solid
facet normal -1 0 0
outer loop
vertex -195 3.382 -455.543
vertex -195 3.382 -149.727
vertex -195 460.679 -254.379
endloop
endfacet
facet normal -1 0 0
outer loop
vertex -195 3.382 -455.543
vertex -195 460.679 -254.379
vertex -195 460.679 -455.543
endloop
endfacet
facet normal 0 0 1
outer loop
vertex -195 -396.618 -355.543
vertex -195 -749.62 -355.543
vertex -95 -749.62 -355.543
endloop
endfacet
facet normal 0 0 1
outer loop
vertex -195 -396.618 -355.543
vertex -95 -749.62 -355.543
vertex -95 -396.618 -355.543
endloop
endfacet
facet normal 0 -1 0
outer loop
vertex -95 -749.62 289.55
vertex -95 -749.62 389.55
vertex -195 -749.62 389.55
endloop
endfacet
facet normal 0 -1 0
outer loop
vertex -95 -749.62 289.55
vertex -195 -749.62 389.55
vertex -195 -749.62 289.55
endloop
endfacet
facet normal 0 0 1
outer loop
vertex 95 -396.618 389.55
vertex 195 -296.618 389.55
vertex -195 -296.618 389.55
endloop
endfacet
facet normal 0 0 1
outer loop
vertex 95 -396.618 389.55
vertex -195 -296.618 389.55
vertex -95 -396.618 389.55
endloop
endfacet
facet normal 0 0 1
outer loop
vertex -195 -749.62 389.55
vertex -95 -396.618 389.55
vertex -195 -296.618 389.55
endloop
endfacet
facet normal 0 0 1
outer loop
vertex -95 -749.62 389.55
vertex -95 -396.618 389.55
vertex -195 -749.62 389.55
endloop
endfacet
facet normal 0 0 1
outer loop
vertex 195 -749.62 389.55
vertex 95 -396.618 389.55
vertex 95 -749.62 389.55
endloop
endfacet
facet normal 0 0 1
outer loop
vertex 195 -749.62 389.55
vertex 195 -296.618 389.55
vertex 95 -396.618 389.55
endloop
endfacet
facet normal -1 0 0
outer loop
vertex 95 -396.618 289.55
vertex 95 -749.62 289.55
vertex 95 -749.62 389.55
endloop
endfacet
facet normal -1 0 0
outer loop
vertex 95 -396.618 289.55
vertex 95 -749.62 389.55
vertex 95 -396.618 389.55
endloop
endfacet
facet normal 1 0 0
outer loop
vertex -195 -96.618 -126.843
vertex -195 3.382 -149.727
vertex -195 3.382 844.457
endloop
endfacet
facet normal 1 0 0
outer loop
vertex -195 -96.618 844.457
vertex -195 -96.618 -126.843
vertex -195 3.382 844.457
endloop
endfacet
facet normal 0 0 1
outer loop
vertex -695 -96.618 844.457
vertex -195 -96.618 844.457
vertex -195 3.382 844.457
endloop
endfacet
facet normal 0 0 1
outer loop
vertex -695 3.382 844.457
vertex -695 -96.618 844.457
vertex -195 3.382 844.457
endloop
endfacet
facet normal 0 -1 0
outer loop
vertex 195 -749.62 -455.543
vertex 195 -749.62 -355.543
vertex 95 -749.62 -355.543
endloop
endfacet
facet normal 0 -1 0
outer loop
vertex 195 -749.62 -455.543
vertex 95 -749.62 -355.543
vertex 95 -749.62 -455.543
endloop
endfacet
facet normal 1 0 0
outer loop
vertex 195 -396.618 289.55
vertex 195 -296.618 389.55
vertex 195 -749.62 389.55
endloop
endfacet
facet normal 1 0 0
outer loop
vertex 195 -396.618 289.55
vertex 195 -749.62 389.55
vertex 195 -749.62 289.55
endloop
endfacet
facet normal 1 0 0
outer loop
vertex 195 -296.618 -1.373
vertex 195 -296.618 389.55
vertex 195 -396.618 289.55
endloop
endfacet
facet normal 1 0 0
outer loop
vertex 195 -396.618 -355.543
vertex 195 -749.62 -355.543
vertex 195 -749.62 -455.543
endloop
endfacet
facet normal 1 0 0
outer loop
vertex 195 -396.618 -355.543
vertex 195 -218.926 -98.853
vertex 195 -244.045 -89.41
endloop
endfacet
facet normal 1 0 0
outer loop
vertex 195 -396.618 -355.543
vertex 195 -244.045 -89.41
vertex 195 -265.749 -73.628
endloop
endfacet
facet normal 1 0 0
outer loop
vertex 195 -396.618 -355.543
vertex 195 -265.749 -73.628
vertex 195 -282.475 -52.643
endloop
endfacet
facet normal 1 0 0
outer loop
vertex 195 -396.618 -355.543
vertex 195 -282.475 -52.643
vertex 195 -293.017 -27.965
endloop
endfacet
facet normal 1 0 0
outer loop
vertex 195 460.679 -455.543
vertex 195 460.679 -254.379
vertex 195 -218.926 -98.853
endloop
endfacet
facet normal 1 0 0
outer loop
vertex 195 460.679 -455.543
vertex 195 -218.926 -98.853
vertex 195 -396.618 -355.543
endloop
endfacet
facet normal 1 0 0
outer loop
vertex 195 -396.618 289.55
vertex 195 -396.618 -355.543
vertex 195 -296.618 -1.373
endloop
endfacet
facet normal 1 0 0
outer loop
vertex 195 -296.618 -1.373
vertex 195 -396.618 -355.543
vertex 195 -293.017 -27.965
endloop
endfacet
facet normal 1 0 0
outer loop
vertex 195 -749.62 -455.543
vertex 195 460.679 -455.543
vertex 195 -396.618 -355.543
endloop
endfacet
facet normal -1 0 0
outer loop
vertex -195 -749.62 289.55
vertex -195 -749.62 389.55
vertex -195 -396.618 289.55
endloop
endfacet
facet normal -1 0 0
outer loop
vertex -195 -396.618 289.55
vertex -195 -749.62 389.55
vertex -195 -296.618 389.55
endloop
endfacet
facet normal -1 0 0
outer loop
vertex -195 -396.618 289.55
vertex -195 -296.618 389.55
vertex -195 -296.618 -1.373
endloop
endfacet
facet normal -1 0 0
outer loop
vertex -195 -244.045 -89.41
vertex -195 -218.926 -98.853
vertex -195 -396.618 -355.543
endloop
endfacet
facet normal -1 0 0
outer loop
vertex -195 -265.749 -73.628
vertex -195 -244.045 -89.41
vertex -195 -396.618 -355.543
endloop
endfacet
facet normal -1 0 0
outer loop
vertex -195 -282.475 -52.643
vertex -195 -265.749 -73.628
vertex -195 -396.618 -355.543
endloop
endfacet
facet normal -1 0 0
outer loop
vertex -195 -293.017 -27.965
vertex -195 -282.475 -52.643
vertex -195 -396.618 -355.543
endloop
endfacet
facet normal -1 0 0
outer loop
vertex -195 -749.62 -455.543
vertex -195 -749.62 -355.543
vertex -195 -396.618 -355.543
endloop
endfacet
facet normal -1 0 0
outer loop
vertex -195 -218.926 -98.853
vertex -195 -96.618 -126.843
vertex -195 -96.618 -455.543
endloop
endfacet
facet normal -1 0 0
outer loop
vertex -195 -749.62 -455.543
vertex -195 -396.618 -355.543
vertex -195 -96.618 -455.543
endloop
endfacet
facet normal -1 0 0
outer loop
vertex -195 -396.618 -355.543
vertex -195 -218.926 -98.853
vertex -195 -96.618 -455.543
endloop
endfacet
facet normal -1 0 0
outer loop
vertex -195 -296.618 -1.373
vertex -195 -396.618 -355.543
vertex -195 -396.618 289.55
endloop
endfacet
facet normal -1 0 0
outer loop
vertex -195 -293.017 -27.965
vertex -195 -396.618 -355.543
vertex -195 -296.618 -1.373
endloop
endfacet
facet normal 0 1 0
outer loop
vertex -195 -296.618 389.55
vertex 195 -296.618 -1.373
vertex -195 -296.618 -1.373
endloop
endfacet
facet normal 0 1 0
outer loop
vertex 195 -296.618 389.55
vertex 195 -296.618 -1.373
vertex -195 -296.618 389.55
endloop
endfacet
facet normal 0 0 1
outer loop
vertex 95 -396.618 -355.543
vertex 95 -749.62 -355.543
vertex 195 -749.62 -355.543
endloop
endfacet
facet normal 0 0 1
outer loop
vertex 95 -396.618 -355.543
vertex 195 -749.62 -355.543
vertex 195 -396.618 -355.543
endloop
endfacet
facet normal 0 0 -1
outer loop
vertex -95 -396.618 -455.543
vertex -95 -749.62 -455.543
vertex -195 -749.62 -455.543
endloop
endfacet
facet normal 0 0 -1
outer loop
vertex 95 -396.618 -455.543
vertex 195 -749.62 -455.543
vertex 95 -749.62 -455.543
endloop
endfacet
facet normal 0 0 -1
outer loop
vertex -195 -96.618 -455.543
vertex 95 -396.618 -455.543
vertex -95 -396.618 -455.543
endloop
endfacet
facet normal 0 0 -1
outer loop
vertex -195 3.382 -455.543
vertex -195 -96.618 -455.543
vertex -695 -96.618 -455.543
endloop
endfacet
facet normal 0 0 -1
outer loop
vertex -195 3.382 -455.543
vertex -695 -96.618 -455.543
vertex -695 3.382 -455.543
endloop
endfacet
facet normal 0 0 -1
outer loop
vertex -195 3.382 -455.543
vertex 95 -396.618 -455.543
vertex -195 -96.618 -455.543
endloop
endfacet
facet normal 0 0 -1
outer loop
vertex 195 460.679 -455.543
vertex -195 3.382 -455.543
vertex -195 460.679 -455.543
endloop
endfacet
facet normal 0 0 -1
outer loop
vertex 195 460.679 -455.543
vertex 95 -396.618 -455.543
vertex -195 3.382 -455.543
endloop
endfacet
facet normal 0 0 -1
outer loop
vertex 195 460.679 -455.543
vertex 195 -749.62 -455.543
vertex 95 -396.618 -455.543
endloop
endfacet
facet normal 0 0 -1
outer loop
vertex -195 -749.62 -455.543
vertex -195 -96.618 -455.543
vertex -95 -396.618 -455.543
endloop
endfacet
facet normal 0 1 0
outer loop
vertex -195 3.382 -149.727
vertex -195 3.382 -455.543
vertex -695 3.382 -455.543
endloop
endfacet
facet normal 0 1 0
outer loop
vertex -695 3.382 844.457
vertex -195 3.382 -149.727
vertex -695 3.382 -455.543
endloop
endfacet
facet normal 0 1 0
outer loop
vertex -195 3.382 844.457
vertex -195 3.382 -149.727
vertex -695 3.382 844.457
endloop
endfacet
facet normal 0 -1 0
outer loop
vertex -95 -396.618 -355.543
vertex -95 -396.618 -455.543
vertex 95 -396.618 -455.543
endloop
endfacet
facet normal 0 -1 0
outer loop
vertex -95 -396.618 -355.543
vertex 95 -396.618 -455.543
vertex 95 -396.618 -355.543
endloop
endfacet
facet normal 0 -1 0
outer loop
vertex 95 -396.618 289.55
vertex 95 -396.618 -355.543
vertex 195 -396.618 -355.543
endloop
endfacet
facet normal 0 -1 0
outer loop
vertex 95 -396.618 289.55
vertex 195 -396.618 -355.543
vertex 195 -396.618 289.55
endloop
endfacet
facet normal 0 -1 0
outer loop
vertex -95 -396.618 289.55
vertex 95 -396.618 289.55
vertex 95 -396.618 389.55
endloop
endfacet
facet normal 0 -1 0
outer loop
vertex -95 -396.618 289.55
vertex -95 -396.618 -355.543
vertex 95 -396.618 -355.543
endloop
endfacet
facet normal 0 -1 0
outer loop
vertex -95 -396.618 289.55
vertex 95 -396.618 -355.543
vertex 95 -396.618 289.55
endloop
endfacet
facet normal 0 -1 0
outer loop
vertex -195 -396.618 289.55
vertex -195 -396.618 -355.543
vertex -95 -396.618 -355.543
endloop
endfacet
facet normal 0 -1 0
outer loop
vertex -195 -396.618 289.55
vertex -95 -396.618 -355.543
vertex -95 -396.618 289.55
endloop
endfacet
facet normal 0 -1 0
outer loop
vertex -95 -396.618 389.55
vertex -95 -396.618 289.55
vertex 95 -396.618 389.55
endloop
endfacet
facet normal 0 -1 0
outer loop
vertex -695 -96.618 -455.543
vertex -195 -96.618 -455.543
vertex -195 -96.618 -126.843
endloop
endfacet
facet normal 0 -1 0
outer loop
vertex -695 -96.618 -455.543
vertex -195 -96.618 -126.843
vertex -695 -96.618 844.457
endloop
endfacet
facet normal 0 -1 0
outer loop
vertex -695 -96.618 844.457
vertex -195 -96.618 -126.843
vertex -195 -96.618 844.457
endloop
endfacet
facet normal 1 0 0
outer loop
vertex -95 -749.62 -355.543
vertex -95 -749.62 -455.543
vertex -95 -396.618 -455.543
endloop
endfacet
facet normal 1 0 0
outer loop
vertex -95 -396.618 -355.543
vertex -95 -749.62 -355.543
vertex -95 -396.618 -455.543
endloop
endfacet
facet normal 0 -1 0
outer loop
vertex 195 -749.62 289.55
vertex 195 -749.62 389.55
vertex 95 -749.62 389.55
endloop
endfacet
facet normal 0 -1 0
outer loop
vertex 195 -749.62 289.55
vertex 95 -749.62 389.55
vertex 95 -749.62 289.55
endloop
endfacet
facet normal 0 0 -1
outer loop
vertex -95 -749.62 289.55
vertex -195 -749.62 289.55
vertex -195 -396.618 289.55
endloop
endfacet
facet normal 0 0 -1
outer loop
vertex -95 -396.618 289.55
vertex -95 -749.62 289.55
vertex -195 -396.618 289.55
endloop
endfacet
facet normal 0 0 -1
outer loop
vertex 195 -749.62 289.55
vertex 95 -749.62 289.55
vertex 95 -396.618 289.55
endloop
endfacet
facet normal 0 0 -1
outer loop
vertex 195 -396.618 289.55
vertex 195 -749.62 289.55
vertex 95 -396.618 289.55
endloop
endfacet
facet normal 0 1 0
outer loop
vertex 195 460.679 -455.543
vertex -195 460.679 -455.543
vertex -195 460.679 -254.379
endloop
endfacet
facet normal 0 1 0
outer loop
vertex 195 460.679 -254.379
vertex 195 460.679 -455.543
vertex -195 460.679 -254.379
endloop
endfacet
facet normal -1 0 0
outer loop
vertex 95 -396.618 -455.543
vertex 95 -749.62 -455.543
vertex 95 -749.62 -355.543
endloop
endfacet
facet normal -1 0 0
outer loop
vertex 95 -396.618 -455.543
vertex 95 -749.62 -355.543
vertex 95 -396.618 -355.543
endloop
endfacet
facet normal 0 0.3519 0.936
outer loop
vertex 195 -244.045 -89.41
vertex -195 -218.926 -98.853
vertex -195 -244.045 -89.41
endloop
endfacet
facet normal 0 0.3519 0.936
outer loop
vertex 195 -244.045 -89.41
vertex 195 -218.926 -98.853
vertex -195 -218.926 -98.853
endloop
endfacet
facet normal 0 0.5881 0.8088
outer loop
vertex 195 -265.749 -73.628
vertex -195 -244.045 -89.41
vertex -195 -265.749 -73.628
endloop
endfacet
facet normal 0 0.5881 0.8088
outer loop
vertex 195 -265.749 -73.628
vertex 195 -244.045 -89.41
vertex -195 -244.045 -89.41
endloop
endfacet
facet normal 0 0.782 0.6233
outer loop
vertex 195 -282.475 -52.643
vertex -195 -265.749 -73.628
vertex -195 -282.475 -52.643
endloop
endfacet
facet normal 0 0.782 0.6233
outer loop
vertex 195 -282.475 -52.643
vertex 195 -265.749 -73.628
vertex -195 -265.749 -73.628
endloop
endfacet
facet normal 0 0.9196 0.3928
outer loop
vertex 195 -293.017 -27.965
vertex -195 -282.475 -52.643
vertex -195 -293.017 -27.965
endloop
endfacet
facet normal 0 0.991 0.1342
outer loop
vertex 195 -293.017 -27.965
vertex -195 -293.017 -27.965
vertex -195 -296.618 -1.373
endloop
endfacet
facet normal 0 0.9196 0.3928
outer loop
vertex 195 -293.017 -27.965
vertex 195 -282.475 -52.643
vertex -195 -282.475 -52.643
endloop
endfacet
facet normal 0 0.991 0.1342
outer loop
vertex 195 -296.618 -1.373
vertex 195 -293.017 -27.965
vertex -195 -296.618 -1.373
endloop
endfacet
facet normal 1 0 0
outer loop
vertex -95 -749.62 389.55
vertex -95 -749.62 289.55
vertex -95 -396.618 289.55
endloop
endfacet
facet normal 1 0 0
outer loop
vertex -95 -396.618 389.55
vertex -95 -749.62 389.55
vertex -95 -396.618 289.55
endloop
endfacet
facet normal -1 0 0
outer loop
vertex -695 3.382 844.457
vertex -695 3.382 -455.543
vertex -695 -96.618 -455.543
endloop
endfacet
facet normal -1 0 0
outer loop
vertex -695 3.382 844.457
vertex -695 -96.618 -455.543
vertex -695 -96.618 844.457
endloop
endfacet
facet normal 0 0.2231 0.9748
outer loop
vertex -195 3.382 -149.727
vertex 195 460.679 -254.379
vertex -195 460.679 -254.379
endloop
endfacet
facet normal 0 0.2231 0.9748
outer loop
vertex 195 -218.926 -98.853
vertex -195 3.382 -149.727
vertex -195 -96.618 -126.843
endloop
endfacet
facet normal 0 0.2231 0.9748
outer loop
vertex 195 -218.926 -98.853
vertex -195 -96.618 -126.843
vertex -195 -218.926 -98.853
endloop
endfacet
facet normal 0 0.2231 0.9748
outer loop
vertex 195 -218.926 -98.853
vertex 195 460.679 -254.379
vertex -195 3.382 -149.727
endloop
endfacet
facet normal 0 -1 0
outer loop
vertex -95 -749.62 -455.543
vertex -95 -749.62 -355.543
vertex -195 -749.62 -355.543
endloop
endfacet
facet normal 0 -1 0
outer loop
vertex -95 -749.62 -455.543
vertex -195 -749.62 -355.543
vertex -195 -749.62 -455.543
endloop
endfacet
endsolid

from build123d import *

# Parameters (mm, degrees)
BOSS_EXTRUDE1_DEPTH     = 195
SKETCH2_W               = 645.093387862
SKETCH2_H               = 353.001731878
CUT_EXTRUDE1_DEPTH      = 1
CUT_EXTRUDE1_DEPTH_BACK = 391
FILLET1_R               = 100
SKETCH3_W               = 190
SKETCH3_H               = 353.001731878
CUT_EXTRUDE2_DEPTH      = 1
CUT_EXTRUDE2_DEPTH_BACK = 846.093387862
SKETCH4_W               = 1300
SKETCH4_H               = 100
BOSS_EXTRUDE2_DEPTH     = 500


with BuildPart() as part:
    # Sketch1 → Boss-Extrude1 (new body, symmetric)
    with BuildSketch(Plane(origin=(0, 0, 0), x_dir=(0, 0, -1), z_dir=(1, 0, 0))):
        Polygon((254.379010846, 460.67890474), (81.072942142, -296.617917801), (-389.549913064, -296.617917801), (-389.549913064, -749.619649679), (455.543474798, -749.619649679), (455.543474798, 460.67890474), align=None)
    extrude(amount=BOSS_EXTRUDE1_DEPTH, both=True)

    # Sketch2 → Cut-Extrude1 (cut, two sides)
    with BuildSketch(Plane.ZY.offset(195)) as cut_extrude1_sk:
        with Locations((-32.996780867, -573.11878374)):
            Rectangle(SKETCH2_W, SKETCH2_H)
    extrude(amount=CUT_EXTRUDE1_DEPTH, mode=Mode.SUBTRACT)
    extrude(cut_extrude1_sk.sketch, amount=-CUT_EXTRUDE1_DEPTH_BACK, mode=Mode.SUBTRACT)

    # Fillet1
    fillet1_edges = [part.edges().sort_by_distance(p)[0] for p in [
        (0, -296.617917801, -81.072942142),
    ]]
    fillet(fillet1_edges, radius=FILLET1_R)

    # Sketch3 → Cut-Extrude2 (cut, two sides)
    with BuildSketch(Plane(origin=(0, 0, -455.543474798), x_dir=(-1, 0, 0), z_dir=(0, 0, -1))) as cut_extrude2_sk:
        with Locations((0, -573.11878374)):
            Rectangle(SKETCH3_W, SKETCH3_H)
    extrude(amount=CUT_EXTRUDE2_DEPTH, mode=Mode.SUBTRACT)
    extrude(cut_extrude2_sk.sketch, amount=-CUT_EXTRUDE2_DEPTH_BACK, mode=Mode.SUBTRACT)

    # Sketch4 → Boss-Extrude2 (add)
    with BuildSketch(Plane.ZY.offset(195)):
        with Locations((194.456525202, -46.617917801)):
            Rectangle(SKETCH4_W, SKETCH4_H)
    extrude(amount=BOSS_EXTRUDE2_DEPTH)


solid = part.part
